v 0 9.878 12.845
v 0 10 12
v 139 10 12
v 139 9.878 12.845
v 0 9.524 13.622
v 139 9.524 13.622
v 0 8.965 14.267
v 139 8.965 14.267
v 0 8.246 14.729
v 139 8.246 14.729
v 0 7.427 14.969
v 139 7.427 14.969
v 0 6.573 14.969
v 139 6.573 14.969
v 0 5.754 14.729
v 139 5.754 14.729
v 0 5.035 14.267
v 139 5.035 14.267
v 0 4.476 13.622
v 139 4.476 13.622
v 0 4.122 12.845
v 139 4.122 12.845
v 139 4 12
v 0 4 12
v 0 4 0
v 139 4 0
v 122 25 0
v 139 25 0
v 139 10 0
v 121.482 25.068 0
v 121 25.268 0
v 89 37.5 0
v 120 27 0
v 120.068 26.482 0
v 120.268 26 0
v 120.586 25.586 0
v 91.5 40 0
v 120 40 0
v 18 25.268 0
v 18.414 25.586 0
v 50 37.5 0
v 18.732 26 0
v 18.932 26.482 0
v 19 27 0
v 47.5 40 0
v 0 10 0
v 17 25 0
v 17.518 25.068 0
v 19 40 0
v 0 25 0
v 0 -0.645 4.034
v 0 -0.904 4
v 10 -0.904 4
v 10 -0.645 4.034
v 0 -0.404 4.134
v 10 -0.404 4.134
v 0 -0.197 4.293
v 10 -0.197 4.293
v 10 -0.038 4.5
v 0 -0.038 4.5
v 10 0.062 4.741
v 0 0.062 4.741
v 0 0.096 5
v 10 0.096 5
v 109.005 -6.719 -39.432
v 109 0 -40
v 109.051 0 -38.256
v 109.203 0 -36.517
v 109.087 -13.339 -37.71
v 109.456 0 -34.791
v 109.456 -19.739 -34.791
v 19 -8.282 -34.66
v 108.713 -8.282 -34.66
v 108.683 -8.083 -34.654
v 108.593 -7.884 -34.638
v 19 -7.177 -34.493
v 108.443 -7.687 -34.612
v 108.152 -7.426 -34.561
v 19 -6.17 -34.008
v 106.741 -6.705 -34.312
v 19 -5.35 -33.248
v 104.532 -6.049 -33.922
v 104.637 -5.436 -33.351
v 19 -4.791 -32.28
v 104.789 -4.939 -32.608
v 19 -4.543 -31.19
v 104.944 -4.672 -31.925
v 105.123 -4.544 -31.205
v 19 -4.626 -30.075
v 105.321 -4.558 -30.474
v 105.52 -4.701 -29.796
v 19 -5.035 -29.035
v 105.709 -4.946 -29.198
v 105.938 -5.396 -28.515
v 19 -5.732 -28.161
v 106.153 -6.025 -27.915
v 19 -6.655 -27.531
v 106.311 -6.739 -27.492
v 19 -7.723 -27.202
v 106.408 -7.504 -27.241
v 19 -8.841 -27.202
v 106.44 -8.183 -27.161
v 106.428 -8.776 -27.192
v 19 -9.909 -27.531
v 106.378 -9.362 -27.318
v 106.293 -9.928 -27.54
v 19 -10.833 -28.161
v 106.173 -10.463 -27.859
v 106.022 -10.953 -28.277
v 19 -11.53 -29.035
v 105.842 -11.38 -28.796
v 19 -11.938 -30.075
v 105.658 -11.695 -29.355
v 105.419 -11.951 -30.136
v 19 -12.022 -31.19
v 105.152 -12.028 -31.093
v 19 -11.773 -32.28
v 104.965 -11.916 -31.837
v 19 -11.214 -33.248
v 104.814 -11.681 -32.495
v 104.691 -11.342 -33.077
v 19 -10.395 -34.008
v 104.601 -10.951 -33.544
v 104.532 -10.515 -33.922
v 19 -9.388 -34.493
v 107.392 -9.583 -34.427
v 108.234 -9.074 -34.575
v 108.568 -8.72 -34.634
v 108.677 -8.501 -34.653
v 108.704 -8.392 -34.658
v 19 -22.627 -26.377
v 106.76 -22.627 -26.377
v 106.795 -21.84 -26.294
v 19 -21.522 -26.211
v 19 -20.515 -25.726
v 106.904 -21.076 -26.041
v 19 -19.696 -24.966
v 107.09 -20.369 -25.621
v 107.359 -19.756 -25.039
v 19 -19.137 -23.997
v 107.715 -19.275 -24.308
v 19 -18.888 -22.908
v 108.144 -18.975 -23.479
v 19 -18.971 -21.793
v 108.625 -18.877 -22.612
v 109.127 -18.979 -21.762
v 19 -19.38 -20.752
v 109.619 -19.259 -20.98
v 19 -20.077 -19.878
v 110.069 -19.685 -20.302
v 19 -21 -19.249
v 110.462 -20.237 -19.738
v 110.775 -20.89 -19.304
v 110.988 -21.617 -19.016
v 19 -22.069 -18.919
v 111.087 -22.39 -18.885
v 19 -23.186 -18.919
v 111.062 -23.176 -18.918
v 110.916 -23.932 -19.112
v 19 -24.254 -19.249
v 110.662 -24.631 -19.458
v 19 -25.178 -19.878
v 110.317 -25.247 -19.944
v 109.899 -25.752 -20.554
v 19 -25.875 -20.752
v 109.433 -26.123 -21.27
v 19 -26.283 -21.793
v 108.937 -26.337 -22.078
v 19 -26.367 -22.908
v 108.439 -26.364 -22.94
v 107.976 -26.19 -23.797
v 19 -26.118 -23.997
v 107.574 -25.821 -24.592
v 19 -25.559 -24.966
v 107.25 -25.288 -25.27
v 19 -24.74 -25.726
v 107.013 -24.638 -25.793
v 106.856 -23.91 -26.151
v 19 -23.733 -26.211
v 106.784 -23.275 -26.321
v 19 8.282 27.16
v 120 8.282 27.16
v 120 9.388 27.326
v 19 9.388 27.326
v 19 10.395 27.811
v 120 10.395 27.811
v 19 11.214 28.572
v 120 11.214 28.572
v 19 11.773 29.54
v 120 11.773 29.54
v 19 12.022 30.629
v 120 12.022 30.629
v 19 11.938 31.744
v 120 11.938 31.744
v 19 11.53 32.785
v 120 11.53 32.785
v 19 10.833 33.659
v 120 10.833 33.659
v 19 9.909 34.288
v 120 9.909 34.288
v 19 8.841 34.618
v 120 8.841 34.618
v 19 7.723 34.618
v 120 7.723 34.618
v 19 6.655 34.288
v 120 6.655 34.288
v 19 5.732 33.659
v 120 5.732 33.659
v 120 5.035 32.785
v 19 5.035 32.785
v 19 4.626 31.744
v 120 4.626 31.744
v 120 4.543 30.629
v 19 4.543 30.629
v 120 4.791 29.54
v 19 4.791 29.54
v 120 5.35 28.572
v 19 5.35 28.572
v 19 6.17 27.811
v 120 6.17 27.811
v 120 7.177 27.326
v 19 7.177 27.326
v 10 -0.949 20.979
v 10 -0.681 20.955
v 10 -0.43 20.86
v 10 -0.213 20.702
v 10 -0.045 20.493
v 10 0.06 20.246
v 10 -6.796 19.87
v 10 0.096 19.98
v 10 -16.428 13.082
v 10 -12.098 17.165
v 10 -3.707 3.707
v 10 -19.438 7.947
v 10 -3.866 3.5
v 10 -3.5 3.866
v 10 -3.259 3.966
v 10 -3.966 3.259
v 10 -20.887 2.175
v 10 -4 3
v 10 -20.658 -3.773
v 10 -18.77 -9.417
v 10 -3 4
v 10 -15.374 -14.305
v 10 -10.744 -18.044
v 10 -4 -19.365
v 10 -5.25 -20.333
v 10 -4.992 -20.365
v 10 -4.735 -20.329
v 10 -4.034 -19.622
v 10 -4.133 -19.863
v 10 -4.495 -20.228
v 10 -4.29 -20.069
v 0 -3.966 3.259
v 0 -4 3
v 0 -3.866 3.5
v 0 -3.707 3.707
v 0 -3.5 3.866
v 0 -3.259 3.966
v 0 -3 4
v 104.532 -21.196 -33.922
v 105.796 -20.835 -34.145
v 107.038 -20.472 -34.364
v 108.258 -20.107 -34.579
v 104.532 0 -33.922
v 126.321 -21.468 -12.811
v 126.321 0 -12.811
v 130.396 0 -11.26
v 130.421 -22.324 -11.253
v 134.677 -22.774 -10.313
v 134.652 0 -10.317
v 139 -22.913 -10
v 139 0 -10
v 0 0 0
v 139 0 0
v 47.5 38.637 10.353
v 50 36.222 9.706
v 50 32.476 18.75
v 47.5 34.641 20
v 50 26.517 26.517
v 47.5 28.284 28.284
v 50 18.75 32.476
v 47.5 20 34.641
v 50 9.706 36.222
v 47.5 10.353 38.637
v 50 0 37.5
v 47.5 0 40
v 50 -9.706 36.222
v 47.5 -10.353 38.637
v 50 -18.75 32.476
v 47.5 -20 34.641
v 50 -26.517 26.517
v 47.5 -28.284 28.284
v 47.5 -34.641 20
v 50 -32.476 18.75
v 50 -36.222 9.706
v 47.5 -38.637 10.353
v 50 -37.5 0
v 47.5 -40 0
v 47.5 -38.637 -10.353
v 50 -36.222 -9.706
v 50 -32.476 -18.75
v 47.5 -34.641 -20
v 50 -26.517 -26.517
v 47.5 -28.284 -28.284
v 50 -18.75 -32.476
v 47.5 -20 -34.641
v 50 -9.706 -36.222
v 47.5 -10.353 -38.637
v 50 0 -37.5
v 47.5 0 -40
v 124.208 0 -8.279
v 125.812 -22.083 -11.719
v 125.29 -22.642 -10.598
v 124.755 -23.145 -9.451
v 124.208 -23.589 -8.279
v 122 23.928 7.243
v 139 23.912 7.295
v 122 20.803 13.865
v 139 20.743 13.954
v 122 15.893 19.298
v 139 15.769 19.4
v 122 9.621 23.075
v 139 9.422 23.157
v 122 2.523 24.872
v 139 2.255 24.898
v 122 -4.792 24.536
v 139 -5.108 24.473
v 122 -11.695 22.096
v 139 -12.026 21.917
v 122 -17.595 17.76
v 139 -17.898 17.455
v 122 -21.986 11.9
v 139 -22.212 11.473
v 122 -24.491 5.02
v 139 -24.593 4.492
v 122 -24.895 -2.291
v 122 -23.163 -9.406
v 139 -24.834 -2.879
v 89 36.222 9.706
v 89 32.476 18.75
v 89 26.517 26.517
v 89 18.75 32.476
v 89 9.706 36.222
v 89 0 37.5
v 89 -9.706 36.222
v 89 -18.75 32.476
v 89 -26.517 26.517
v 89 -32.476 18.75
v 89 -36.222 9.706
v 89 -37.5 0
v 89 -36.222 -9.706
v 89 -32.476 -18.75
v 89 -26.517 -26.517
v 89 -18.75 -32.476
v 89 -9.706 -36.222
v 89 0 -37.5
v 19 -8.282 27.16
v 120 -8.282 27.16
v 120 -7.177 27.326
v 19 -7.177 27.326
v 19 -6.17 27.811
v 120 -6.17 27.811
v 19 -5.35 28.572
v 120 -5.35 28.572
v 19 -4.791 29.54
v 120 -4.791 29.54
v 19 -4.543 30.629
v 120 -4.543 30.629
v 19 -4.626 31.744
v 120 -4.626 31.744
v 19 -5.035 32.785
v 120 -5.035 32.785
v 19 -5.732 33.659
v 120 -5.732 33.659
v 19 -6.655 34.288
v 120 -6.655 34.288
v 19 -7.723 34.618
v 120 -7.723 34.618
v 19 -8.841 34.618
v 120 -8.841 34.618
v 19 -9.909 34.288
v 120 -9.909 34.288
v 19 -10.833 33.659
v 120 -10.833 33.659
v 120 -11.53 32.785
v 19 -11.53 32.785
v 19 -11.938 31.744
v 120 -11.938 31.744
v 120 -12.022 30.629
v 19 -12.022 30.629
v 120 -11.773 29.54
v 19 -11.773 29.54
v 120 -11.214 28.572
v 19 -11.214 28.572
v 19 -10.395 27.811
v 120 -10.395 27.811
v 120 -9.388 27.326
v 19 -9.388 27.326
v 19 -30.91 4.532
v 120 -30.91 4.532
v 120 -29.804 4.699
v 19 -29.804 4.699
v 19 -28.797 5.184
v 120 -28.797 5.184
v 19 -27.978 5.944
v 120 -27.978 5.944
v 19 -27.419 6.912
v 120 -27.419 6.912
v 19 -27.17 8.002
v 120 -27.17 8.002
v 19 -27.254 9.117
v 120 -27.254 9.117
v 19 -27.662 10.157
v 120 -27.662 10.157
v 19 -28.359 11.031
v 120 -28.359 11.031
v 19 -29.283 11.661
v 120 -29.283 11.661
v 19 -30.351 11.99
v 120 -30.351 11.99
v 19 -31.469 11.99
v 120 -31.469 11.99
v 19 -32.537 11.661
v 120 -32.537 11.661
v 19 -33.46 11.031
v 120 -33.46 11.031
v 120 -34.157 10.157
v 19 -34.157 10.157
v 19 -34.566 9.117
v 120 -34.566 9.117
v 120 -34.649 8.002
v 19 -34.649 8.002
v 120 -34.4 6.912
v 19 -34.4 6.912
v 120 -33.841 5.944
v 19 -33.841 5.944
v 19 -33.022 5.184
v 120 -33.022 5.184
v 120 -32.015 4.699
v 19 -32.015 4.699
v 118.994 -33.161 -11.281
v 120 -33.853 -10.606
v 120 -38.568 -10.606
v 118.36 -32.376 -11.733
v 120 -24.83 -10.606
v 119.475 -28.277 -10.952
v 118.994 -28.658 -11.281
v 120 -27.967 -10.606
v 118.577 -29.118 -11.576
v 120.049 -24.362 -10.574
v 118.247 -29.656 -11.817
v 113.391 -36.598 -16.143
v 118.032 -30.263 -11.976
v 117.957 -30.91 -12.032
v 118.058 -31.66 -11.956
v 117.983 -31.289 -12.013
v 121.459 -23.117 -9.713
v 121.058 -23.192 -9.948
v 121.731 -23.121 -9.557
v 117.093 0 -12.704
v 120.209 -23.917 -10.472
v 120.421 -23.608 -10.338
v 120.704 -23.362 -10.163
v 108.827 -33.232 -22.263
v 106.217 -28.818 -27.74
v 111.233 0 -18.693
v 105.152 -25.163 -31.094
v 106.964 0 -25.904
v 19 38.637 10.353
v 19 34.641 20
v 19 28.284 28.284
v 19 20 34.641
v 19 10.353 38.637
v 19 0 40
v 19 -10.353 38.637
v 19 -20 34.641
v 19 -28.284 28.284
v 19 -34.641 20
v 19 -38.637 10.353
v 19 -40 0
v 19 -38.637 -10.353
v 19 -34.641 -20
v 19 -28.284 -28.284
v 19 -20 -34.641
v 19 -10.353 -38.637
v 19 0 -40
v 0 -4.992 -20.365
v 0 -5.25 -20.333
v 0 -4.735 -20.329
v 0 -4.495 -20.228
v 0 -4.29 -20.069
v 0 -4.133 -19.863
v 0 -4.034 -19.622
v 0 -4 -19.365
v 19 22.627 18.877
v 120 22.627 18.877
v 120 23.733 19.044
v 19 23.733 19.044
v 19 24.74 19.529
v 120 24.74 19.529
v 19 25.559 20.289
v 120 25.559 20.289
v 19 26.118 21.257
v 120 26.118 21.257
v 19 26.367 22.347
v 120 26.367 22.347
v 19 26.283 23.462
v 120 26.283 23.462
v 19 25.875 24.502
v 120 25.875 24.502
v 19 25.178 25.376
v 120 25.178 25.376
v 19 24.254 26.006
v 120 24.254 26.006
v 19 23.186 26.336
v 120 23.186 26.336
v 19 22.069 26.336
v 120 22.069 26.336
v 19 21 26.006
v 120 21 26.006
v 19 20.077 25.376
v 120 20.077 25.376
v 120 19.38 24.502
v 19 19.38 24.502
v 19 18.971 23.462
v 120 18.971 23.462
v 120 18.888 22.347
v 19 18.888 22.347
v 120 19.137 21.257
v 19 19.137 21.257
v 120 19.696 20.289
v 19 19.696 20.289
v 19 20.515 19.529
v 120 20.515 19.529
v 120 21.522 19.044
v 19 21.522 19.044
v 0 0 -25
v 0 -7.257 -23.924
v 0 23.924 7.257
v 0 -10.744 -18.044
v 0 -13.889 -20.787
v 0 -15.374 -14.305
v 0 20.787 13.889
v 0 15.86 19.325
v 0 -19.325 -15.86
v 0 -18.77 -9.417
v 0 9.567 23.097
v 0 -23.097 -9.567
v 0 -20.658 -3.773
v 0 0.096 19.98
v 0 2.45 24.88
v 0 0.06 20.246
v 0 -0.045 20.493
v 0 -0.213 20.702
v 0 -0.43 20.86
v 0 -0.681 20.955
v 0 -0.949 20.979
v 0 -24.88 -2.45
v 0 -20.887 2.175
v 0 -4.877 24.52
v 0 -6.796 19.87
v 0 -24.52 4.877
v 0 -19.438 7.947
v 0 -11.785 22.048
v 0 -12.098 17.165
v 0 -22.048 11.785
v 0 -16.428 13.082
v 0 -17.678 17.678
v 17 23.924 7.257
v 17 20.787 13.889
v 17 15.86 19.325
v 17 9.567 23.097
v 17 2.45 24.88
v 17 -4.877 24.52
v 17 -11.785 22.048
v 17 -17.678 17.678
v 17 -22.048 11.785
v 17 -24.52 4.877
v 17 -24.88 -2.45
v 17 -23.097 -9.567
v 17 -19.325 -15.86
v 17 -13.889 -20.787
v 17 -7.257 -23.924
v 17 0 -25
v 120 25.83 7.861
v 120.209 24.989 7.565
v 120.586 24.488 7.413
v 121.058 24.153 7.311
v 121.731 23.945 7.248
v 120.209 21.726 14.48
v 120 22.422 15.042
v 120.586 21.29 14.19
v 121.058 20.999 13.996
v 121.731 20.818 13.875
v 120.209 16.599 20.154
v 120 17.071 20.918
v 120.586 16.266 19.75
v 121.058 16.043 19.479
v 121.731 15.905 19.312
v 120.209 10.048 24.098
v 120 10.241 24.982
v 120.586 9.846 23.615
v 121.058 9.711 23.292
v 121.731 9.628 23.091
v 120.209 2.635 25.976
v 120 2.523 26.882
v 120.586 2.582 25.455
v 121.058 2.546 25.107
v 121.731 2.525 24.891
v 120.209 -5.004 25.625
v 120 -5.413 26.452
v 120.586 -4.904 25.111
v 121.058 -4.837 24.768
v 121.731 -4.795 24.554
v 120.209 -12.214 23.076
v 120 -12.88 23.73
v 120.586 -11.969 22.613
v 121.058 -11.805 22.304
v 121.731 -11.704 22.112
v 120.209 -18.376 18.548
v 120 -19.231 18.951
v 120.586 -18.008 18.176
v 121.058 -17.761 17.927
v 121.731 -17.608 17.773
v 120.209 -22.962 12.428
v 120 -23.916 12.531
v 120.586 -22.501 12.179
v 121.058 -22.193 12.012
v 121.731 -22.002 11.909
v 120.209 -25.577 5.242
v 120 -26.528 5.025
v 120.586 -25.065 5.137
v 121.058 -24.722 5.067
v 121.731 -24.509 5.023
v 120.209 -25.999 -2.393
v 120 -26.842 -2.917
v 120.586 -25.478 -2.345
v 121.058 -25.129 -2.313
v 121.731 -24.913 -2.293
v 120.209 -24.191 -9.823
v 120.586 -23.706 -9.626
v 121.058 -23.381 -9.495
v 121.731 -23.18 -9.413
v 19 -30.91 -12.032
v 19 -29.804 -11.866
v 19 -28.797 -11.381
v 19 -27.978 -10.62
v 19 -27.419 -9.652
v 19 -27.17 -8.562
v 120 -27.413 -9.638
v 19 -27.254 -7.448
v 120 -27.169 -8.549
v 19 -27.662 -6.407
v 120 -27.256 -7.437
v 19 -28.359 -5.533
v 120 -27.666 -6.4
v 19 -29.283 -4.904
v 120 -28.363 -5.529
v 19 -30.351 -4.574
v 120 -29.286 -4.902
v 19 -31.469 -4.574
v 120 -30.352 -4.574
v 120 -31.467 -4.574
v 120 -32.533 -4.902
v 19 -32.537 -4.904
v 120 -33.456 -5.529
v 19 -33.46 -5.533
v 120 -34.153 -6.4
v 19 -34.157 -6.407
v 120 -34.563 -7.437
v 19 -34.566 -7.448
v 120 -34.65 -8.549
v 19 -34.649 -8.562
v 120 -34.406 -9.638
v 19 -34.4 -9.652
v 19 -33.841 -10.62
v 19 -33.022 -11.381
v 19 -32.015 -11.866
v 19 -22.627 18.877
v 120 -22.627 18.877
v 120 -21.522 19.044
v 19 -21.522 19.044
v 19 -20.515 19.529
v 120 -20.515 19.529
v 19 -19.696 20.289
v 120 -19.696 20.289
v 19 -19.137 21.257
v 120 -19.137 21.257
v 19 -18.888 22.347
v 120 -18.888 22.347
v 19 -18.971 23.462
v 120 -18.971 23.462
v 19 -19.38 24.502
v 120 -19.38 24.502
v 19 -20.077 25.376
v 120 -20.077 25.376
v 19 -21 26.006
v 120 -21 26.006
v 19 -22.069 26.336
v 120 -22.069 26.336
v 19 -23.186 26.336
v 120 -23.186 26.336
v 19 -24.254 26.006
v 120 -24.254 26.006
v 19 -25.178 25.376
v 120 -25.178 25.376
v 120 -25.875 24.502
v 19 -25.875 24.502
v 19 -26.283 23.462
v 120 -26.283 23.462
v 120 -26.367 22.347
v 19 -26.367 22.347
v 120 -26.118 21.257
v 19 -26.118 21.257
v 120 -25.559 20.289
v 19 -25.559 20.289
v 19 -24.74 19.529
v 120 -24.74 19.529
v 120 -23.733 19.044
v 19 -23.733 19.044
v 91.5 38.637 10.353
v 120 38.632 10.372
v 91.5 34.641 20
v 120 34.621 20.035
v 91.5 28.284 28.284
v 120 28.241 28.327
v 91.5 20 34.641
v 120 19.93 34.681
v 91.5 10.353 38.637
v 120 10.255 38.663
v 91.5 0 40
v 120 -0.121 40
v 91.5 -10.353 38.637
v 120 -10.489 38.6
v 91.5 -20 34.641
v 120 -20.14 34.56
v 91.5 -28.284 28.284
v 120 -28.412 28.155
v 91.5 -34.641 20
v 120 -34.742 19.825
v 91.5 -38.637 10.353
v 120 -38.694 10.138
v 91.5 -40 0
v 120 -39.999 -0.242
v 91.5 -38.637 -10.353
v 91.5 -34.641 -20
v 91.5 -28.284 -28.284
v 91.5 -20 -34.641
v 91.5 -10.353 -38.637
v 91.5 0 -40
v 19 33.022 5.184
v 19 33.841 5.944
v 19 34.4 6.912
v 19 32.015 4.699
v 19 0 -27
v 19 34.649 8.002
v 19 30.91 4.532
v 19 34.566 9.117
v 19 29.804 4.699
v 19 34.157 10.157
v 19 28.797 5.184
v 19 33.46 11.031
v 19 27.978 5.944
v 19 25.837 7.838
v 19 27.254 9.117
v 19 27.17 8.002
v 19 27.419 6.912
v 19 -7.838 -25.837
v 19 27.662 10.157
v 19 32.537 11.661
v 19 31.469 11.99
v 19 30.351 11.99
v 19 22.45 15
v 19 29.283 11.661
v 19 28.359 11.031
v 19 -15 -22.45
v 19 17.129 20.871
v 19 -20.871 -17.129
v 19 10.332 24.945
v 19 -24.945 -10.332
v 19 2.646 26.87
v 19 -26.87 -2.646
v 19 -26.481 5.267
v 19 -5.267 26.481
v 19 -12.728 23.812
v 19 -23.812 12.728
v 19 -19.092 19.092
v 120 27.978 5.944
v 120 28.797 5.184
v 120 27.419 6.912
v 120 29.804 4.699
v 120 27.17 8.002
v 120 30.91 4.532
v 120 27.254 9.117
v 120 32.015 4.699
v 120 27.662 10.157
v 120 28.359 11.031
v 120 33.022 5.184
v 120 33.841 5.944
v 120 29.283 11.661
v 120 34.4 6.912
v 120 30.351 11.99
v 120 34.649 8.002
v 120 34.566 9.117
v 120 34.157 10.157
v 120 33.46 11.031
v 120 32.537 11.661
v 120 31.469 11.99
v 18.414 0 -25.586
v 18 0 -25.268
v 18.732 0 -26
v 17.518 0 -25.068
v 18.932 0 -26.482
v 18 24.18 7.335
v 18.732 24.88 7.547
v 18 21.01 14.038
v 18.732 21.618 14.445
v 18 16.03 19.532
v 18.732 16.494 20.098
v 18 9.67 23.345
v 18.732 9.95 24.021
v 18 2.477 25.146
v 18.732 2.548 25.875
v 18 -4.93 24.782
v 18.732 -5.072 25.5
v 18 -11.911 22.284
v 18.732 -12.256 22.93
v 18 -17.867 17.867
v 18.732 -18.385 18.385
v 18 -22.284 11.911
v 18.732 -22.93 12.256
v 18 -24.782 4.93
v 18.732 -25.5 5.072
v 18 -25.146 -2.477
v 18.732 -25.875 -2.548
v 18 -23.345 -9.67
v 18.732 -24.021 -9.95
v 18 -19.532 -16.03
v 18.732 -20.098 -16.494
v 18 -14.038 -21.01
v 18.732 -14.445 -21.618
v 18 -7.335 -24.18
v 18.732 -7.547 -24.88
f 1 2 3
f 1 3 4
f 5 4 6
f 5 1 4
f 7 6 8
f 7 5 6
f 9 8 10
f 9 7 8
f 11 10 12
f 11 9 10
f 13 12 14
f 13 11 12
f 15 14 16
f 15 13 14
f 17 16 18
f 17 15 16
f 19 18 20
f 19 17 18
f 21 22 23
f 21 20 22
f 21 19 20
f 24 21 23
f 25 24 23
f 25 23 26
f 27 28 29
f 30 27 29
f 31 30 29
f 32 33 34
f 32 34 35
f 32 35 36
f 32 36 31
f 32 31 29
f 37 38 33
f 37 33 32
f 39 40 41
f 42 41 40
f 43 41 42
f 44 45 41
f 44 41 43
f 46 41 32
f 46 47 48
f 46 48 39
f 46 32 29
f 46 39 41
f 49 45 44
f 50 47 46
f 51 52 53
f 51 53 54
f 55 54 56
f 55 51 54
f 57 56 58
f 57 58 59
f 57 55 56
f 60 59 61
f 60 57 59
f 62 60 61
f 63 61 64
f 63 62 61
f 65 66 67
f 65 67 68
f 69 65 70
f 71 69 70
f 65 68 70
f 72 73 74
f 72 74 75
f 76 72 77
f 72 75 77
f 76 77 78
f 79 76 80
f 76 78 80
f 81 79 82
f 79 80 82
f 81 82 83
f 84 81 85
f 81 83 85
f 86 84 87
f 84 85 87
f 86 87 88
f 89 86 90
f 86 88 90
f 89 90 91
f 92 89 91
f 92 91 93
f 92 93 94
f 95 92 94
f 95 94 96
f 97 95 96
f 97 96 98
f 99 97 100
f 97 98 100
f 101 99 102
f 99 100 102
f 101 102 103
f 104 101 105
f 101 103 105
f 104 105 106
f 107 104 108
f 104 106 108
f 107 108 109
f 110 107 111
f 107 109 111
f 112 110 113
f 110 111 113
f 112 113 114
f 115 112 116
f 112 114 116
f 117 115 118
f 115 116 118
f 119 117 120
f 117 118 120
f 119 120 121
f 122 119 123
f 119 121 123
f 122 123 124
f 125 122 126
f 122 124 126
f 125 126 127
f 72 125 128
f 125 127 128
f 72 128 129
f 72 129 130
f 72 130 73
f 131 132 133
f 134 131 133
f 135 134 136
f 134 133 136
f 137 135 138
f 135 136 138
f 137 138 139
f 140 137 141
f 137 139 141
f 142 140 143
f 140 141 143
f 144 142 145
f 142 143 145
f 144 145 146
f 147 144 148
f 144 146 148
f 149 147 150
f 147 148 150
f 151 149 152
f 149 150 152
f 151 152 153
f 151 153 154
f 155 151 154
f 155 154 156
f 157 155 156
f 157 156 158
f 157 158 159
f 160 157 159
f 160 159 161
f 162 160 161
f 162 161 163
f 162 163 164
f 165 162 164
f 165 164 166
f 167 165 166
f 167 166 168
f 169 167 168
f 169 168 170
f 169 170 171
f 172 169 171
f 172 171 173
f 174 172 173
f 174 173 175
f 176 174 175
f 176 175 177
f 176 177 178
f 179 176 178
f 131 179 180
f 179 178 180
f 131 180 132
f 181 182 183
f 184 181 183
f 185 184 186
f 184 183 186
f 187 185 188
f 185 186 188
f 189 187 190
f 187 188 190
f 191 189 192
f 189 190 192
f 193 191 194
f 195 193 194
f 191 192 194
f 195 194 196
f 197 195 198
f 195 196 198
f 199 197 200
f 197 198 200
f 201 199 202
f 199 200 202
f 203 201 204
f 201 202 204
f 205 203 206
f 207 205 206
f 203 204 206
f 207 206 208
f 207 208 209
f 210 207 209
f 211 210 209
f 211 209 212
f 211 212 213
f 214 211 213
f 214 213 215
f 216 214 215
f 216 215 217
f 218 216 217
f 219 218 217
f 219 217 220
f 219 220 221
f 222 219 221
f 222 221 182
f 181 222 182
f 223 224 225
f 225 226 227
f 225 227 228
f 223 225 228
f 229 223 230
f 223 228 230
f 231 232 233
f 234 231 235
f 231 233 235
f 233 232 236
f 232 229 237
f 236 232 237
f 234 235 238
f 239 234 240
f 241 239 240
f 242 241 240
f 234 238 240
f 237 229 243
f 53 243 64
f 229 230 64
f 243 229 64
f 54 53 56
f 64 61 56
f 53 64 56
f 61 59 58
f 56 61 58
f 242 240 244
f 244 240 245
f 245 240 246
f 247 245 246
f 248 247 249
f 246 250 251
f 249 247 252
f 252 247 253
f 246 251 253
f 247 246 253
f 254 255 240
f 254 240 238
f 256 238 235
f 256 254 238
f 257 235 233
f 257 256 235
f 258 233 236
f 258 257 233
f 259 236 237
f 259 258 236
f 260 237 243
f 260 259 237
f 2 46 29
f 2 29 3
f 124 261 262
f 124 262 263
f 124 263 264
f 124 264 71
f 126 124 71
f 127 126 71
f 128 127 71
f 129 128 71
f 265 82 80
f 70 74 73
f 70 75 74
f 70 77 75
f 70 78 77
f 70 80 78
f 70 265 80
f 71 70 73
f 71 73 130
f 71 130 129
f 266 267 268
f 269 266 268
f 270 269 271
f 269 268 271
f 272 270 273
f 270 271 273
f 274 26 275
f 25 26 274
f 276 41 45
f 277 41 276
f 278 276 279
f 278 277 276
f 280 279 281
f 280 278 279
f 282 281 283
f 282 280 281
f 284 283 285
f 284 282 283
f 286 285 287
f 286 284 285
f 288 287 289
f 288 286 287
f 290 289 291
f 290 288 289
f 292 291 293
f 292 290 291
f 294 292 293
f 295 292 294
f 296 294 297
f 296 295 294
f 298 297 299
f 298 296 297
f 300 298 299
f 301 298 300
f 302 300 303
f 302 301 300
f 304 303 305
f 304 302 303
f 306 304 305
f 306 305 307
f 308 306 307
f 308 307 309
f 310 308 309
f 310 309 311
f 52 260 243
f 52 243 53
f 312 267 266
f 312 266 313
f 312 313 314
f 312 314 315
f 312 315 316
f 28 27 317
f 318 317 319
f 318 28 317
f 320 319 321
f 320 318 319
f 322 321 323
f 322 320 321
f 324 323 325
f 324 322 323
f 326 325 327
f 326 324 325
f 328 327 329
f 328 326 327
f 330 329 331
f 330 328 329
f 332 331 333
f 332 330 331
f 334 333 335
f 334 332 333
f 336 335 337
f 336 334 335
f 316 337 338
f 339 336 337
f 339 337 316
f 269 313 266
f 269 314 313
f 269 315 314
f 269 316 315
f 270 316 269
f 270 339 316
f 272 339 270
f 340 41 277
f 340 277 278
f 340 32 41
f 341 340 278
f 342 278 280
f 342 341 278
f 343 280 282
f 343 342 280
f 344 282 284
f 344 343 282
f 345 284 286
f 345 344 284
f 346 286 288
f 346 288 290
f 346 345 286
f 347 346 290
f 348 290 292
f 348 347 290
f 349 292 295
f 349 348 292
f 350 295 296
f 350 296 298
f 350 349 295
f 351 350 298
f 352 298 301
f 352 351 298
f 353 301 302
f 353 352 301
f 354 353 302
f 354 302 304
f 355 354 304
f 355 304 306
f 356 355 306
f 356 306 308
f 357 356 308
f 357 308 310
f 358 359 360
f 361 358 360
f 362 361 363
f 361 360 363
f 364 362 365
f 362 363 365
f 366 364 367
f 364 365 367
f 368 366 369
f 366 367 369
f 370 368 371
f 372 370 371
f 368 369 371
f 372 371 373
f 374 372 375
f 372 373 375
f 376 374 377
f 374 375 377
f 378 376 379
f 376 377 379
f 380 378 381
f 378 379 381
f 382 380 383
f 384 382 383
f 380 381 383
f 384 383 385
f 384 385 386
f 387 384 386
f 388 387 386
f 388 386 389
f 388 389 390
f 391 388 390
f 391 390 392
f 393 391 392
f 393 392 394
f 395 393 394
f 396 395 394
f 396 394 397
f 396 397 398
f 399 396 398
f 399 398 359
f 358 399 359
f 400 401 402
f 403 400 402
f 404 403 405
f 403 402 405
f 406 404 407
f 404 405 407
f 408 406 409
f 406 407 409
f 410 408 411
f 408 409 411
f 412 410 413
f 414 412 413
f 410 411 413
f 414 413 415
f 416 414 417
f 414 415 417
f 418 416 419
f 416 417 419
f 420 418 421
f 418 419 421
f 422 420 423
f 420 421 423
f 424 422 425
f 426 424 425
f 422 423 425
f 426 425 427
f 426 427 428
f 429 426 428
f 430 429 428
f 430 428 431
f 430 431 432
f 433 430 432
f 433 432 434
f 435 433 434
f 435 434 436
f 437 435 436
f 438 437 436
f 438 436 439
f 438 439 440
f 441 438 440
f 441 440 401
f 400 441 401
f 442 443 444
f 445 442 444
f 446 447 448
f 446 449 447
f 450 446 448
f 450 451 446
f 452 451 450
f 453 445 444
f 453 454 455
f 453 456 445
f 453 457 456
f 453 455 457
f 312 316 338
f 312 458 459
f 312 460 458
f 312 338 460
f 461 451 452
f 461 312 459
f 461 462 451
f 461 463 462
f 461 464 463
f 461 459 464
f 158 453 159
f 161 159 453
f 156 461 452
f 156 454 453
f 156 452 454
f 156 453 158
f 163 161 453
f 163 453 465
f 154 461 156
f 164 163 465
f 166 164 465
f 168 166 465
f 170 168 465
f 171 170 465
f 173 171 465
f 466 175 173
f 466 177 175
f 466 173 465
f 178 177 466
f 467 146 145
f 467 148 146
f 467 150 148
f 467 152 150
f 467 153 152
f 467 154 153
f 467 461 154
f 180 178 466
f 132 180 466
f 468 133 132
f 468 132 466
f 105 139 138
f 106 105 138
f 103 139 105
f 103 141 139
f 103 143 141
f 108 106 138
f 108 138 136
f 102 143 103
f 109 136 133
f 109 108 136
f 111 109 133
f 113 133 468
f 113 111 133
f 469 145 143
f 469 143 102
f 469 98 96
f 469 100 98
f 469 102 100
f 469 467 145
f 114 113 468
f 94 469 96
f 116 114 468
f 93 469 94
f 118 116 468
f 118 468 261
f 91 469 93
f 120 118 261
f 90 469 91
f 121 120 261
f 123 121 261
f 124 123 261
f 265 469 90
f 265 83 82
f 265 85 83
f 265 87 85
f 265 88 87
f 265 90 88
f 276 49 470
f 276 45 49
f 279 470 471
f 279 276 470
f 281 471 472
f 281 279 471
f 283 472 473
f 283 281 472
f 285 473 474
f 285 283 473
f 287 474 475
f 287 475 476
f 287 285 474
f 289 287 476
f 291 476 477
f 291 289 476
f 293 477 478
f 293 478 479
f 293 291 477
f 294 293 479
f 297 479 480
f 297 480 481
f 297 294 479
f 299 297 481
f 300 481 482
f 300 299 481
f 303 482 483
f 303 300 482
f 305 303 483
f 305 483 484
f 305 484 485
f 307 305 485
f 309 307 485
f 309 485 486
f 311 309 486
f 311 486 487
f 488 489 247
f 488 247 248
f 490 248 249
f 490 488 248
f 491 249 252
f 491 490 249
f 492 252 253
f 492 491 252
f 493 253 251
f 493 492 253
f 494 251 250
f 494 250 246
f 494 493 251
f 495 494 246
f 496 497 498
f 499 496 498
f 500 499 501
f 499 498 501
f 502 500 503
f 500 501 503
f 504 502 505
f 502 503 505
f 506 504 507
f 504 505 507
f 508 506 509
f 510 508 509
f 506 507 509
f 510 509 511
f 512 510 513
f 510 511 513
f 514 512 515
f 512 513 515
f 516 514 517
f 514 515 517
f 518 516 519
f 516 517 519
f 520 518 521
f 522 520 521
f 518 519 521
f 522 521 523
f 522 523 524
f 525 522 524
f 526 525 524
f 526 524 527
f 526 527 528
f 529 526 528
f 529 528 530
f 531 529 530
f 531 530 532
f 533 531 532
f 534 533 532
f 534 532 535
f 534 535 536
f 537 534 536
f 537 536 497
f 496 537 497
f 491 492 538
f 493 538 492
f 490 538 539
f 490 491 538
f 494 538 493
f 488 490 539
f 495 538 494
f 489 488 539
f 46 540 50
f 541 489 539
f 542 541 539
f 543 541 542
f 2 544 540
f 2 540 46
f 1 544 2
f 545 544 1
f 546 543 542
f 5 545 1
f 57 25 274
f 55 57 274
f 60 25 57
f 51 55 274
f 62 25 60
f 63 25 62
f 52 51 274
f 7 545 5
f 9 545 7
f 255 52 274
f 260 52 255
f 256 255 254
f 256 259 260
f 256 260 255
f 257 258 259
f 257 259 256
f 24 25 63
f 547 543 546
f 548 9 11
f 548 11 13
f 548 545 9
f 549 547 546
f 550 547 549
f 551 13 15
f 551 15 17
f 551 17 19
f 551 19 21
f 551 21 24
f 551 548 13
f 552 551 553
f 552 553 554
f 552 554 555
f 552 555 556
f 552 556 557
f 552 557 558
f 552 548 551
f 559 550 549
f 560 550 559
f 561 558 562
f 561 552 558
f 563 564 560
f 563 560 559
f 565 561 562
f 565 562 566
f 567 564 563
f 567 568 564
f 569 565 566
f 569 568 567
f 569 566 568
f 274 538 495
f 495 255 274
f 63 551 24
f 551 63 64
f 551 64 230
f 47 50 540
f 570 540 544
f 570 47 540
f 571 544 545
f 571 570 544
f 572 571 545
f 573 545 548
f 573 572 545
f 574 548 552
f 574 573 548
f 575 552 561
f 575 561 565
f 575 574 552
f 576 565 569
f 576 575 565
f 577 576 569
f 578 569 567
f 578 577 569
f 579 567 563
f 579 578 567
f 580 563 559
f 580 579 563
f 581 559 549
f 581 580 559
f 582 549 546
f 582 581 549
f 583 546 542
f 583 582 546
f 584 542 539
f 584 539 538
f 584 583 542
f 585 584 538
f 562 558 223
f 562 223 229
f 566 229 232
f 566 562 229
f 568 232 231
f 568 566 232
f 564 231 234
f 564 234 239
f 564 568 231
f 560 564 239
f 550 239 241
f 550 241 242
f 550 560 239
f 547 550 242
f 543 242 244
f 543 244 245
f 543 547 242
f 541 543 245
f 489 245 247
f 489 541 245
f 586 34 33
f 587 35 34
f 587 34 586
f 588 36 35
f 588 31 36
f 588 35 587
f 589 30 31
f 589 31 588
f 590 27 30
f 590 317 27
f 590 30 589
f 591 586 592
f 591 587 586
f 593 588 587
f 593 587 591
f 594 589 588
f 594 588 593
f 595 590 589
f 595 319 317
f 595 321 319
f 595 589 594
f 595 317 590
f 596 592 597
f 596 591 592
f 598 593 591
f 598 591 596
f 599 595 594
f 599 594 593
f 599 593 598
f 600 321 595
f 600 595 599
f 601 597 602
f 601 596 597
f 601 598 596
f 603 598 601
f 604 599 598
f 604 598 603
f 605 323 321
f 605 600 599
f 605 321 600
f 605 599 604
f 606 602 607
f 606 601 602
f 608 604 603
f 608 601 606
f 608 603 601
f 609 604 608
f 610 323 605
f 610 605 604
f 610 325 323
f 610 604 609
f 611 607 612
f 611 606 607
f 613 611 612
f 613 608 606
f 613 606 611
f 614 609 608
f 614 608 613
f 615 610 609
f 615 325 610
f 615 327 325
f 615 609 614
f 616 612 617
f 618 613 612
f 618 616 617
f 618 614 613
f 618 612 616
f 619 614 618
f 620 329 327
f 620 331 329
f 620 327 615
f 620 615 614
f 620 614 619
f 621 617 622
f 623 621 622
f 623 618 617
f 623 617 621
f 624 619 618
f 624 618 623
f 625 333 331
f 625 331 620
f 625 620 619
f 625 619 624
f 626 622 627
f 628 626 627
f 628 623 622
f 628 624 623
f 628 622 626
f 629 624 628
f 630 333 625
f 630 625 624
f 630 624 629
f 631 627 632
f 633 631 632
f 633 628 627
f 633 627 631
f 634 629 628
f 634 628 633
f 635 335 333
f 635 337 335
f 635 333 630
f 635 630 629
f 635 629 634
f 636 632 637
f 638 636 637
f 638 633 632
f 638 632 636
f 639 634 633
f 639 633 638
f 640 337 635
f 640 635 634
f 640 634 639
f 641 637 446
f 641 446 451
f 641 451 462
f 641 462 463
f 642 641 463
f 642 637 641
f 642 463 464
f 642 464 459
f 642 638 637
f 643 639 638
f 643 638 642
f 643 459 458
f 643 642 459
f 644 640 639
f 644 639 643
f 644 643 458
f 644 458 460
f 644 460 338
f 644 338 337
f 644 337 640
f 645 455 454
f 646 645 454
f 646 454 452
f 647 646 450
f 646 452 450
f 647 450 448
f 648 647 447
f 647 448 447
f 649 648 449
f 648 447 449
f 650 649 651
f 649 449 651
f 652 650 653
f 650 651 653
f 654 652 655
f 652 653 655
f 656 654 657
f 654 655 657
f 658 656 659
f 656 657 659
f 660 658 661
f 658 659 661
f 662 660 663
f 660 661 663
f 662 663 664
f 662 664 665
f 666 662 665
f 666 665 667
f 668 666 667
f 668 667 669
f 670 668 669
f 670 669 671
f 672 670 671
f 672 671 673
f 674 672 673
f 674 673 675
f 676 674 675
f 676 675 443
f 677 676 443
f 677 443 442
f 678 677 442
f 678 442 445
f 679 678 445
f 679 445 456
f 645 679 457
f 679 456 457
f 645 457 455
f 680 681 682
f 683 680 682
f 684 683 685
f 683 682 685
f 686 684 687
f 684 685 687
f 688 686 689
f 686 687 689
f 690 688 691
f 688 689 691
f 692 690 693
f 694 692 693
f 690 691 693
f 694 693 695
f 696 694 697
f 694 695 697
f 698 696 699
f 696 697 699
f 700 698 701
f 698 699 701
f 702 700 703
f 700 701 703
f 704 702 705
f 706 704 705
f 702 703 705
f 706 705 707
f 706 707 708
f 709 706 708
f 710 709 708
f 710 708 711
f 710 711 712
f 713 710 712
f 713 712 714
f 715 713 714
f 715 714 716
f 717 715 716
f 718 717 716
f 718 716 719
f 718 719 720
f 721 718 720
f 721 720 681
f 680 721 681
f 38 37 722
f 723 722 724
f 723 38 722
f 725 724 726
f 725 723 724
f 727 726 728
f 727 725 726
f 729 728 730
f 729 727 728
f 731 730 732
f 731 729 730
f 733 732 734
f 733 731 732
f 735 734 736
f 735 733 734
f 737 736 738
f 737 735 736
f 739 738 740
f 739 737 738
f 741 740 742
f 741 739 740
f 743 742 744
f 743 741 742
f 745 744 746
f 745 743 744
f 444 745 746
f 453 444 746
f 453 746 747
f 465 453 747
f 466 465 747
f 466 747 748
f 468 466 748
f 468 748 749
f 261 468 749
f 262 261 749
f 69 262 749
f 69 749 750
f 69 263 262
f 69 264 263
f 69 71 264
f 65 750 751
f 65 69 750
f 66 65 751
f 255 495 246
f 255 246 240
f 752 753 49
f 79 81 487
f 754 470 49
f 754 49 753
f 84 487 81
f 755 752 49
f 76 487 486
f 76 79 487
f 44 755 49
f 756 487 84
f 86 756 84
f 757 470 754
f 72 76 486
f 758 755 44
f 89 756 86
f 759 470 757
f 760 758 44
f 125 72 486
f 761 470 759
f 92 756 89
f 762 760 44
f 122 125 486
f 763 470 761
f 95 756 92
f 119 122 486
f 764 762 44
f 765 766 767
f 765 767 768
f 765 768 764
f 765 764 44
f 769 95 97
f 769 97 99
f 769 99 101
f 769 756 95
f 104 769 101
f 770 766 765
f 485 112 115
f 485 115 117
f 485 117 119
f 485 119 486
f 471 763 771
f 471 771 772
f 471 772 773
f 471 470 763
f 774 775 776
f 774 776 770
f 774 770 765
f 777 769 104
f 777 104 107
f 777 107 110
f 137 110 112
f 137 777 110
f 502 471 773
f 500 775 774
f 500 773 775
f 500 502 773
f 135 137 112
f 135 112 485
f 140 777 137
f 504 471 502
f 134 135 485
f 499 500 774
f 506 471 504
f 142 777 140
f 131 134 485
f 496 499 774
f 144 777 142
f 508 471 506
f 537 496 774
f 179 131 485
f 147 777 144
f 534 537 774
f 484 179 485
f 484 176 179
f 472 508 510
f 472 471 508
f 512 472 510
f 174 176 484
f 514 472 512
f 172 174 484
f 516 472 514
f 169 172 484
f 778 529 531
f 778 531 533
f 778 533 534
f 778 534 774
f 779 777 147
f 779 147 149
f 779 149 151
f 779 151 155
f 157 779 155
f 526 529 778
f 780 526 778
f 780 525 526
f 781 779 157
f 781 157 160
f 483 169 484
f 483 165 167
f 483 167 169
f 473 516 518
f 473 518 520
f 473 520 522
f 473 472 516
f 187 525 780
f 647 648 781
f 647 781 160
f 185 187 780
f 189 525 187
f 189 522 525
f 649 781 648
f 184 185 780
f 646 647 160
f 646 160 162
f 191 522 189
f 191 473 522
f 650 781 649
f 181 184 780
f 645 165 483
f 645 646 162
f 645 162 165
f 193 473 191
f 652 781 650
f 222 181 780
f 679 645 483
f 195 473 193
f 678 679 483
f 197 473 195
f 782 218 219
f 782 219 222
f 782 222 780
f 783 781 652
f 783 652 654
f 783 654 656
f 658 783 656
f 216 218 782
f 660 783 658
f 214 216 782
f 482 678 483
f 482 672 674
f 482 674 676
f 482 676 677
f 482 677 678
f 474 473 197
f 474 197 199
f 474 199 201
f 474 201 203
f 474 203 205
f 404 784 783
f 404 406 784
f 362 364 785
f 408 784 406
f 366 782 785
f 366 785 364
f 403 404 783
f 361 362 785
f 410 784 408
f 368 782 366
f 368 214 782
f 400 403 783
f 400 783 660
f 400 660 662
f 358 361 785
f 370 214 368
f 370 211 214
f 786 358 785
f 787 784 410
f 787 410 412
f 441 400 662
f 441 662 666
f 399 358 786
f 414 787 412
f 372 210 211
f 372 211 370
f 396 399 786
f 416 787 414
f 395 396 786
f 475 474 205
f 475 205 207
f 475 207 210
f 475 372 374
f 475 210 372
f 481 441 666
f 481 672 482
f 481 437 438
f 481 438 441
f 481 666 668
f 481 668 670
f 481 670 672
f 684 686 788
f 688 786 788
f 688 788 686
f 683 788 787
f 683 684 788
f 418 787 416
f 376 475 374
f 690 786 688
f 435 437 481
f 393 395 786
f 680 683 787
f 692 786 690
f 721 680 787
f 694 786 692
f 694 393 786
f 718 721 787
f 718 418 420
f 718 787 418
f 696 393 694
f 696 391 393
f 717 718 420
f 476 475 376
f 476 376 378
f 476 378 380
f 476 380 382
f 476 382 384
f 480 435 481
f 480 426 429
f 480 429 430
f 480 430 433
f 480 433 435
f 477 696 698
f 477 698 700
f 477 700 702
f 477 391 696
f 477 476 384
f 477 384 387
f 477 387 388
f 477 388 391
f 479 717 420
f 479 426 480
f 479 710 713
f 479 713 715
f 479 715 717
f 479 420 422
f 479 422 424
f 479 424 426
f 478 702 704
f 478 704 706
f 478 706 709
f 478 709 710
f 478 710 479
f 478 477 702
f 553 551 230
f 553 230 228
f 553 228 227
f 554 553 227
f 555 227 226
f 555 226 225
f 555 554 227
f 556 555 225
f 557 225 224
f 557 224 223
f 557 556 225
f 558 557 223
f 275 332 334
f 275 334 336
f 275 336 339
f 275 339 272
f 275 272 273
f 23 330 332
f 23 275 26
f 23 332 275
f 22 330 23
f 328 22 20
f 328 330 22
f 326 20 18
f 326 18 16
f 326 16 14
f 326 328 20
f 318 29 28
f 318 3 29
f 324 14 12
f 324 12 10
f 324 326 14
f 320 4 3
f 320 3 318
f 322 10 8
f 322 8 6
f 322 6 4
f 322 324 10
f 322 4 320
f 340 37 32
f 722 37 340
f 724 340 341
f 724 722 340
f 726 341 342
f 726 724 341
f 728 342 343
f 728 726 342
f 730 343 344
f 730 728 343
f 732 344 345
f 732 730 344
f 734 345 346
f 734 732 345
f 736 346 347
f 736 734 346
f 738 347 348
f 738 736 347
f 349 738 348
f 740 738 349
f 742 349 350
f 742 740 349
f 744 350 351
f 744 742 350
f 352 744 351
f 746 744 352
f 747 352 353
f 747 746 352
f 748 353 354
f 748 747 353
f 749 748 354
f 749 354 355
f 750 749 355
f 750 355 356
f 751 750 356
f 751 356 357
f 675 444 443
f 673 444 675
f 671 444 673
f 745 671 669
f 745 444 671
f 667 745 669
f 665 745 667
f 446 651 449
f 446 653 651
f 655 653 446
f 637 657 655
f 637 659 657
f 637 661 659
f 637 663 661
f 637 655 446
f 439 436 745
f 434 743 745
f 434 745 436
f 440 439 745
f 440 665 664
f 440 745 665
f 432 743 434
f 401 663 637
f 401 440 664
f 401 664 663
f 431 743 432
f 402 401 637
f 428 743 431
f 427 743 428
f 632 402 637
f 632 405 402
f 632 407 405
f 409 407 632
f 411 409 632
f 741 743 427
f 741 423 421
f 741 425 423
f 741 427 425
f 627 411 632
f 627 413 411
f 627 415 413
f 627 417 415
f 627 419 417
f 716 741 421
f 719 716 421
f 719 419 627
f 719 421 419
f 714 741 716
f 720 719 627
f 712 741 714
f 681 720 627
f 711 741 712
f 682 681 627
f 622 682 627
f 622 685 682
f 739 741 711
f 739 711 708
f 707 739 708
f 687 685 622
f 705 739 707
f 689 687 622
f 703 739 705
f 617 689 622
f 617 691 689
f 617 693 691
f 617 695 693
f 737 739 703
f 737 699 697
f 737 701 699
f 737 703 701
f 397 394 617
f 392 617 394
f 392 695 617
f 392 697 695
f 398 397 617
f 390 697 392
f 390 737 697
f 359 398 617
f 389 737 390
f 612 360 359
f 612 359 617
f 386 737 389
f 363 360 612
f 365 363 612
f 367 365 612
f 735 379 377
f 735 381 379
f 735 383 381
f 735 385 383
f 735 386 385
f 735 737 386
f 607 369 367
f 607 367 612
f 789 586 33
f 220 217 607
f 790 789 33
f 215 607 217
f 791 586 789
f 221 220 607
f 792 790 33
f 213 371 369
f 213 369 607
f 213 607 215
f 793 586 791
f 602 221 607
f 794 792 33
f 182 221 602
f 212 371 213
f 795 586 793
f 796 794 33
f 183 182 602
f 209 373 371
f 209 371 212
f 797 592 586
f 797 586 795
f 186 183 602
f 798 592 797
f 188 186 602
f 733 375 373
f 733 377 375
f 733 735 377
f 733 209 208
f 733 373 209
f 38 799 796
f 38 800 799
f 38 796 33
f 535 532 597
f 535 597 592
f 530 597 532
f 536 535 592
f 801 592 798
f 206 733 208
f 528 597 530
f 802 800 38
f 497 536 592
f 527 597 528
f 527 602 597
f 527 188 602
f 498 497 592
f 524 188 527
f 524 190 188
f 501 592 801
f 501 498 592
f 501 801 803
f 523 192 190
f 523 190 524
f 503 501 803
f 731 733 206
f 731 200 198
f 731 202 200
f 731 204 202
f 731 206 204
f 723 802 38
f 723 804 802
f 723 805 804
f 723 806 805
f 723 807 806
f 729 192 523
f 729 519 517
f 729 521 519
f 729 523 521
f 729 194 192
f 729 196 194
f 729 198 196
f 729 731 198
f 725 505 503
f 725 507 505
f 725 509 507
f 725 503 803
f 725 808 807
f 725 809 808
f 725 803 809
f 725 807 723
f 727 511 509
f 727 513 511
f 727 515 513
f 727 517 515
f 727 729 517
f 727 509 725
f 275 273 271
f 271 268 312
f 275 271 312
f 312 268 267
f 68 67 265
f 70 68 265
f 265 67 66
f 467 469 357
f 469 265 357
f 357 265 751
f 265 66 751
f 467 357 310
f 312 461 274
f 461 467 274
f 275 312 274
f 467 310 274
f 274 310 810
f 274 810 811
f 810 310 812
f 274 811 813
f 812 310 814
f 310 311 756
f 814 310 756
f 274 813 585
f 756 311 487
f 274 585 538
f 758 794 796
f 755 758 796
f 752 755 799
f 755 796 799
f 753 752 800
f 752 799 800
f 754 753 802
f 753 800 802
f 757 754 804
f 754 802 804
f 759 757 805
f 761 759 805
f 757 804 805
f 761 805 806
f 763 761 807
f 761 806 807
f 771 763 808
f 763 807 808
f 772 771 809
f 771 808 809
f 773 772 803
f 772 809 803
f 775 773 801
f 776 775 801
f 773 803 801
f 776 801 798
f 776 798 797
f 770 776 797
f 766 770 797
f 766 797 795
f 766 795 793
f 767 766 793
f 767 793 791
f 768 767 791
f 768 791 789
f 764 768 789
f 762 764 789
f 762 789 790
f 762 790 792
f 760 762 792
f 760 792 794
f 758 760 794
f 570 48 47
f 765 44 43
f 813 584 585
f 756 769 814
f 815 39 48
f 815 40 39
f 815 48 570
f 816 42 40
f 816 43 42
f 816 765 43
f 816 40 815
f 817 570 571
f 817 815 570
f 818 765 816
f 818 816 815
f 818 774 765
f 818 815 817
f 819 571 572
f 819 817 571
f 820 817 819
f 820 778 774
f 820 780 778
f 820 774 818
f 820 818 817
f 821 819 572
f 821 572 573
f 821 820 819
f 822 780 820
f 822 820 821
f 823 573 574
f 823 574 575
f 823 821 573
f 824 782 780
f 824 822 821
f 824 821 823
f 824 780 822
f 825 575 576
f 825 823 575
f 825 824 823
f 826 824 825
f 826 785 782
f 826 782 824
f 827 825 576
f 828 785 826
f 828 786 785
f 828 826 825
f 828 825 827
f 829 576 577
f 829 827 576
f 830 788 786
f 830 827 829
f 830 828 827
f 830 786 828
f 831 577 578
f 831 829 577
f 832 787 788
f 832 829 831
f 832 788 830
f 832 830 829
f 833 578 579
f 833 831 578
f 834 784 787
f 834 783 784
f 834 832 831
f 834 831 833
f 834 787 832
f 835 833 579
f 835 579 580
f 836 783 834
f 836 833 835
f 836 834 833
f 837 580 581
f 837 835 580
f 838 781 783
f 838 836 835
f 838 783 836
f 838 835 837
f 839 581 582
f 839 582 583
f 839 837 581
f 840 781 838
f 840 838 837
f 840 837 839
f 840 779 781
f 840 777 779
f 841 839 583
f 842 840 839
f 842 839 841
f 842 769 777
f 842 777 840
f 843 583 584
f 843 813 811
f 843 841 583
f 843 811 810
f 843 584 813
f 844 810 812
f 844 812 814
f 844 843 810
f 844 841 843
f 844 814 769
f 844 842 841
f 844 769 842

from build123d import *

# Parameters (mm, degrees)
REVOLVE1_ANGLE     = 270
CUT_EXTRUDE1_DEPTH = 151.069983674
SKETCH3_R          = 3.75
CUT_EXTRUDE2_DEPTH = 133.664991614
SKETCH5_R          = 30
CUT_EXTRUDE3_DEPTH = 151.069983674
CUT_EXTRUDE4_DEPTH = 151.06998382
CUT_EXTRUDE5_DEPTH = 10


with BuildPart() as part:
    # Sketch1 → Revolve1 (revolve)
    with BuildSketch(Plane.XY):
        with BuildLine():
            Line((47.5, 40), (50, 37.5))
            Line((50, 37.5), (89, 37.5))
            Line((89, 37.5), (91.5, 40))
            Line((91.5, 40), (120, 40))
            Line((120, 40), (120, 27))
            ThreePointArc((120, 27), (120.585786438, 25.585786438), (122, 25))
            Line((122, 25), (139, 25))
            Line((139, 25), (139, 0))
            Line((139, 0), (0, 0))
            Line((0, 0), (0, 25))
            Line((0, 25), (17, 25))
            ThreePointArc((17, 25), (18.414213562, 25.585786438), (19, 27))
            Line((19, 27), (19, 40))
            Line((19, 40), (47.5, 40))
        make_face()
    revolve(axis=Axis((0, 0, 0), (1, 0, 0)), revolution_arc=REVOLVE1_ANGLE)

    # Sketch2 → Cut-Extrude1 (cut, through all)
    with BuildSketch(Plane.ZY):
        with BuildLine():
            Line((0, 10), (12, 10))
            ThreePointArc((12, 10), (15, 7), (12, 4))
            Line((12, 4), (0, 4))
            ThreePointArc((0, 4), (-3, 7), (0, 10))
        make_face()
    extrude(amount=-CUT_EXTRUDE1_DEPTH, mode=Mode.SUBTRACT)

    # Sketch3 → Cut-Extrude2 (cut, through all)
    with BuildSketch(Plane(origin=(120, 0, 0), x_dir=(0, 0, -1), z_dir=(1, 0, 0))):
        with Locations((-8.282209443, 30.909626441)):
            Circle(SKETCH3_R)
        with Locations((30.909626441, -8.282209443)):
            Circle(SKETCH3_R)
        with Locations((22.627416998, -22.627416998)):
            Circle(SKETCH3_R)
        with Locations((8.282209443, -30.909626441)):
            Circle(SKETCH3_R)
        with Locations((-8.282209443, -30.909626441)):
            Circle(SKETCH3_R)
        with Locations((-22.627416998, -22.627416998)):
            Circle(SKETCH3_R)
        with Locations((-30.909626441, -8.282209443)):
            Circle(SKETCH3_R)
        with Locations((-30.909626441, 8.282209443)):
            Circle(SKETCH3_R)
        with Locations((-22.627416998, 22.627416998)):
            Circle(SKETCH3_R)
    extrude(amount=-CUT_EXTRUDE2_DEPTH, mode=Mode.SUBTRACT)

    # Sketch5 → Cut-Extrude3 (cut, through all)
    with BuildSketch(Plane(origin=(0, 0, 0), x_dir=(1, 0, 0), z_dir=(0, 1, 0))):
        with Locations((139, 40)):
            Circle(SKETCH5_R)
    extrude(amount=-CUT_EXTRUDE3_DEPTH, mode=Mode.SUBTRACT)

    # Sketch6 → Cut-Extrude4 (cut, through all)
    with BuildSketch(Plane(origin=(0, 0, 0), x_dir=(1, 0, 0), z_dir=(0, 1, 0))):
        with BuildLine():
            Line((104.531728645, 33.922313782), (109.45576741, 34.79055467))
            ThreePointArc((109.45576741, 34.79055467), (115.199399791, 21.73715713), (126.321452148, 12.810766389))
            Line((126.321452148, 12.810766389), (124.208360839, 8.279227454))
            ThreePointArc((124.208360839, 8.279227454), (111.23263309, 18.693349985), (104.531728645, 33.922313782))
        make_face()
    extrude(amount=-CUT_EXTRUDE4_DEPTH, mode=Mode.SUBTRACT)

    # Sketch8 → Cut-Extrude5 (cut)
    with BuildSketch(Plane.ZY):
        with BuildLine():
            Line((-19.364916731, -4), (-0.400463796, -4))
            Line((-0.400463796, -4), (3, -4))
            ThreePointArc((3, -4), (3.707106781, -3.707106781), (4, -3))
            Line((4, -3), (4, -0.903690713))
            ThreePointArc((4, -0.903690713), (4.292893219, -0.196583931), (5, 0.096309287))
            Line((5, 0.096309287), (19.979573146, 0.096309287))
            ThreePointArc((19.979573146, 0.096309287), (20.702478581, -0.21274373), (20.978551803, -0.948875248))
            ThreePointArc((20.978551803, -0.948875248), (2.174637981, -20.887100078), (-20.333162568, -5.25))
            ThreePointArc((-20.333162568, -5.25), (-20.155486146, -4.387627564), (-19.364916731, -4))
        make_face()
    extrude(amount=-CUT_EXTRUDE5_DEPTH, mode=Mode.SUBTRACT)


solid = part.part
